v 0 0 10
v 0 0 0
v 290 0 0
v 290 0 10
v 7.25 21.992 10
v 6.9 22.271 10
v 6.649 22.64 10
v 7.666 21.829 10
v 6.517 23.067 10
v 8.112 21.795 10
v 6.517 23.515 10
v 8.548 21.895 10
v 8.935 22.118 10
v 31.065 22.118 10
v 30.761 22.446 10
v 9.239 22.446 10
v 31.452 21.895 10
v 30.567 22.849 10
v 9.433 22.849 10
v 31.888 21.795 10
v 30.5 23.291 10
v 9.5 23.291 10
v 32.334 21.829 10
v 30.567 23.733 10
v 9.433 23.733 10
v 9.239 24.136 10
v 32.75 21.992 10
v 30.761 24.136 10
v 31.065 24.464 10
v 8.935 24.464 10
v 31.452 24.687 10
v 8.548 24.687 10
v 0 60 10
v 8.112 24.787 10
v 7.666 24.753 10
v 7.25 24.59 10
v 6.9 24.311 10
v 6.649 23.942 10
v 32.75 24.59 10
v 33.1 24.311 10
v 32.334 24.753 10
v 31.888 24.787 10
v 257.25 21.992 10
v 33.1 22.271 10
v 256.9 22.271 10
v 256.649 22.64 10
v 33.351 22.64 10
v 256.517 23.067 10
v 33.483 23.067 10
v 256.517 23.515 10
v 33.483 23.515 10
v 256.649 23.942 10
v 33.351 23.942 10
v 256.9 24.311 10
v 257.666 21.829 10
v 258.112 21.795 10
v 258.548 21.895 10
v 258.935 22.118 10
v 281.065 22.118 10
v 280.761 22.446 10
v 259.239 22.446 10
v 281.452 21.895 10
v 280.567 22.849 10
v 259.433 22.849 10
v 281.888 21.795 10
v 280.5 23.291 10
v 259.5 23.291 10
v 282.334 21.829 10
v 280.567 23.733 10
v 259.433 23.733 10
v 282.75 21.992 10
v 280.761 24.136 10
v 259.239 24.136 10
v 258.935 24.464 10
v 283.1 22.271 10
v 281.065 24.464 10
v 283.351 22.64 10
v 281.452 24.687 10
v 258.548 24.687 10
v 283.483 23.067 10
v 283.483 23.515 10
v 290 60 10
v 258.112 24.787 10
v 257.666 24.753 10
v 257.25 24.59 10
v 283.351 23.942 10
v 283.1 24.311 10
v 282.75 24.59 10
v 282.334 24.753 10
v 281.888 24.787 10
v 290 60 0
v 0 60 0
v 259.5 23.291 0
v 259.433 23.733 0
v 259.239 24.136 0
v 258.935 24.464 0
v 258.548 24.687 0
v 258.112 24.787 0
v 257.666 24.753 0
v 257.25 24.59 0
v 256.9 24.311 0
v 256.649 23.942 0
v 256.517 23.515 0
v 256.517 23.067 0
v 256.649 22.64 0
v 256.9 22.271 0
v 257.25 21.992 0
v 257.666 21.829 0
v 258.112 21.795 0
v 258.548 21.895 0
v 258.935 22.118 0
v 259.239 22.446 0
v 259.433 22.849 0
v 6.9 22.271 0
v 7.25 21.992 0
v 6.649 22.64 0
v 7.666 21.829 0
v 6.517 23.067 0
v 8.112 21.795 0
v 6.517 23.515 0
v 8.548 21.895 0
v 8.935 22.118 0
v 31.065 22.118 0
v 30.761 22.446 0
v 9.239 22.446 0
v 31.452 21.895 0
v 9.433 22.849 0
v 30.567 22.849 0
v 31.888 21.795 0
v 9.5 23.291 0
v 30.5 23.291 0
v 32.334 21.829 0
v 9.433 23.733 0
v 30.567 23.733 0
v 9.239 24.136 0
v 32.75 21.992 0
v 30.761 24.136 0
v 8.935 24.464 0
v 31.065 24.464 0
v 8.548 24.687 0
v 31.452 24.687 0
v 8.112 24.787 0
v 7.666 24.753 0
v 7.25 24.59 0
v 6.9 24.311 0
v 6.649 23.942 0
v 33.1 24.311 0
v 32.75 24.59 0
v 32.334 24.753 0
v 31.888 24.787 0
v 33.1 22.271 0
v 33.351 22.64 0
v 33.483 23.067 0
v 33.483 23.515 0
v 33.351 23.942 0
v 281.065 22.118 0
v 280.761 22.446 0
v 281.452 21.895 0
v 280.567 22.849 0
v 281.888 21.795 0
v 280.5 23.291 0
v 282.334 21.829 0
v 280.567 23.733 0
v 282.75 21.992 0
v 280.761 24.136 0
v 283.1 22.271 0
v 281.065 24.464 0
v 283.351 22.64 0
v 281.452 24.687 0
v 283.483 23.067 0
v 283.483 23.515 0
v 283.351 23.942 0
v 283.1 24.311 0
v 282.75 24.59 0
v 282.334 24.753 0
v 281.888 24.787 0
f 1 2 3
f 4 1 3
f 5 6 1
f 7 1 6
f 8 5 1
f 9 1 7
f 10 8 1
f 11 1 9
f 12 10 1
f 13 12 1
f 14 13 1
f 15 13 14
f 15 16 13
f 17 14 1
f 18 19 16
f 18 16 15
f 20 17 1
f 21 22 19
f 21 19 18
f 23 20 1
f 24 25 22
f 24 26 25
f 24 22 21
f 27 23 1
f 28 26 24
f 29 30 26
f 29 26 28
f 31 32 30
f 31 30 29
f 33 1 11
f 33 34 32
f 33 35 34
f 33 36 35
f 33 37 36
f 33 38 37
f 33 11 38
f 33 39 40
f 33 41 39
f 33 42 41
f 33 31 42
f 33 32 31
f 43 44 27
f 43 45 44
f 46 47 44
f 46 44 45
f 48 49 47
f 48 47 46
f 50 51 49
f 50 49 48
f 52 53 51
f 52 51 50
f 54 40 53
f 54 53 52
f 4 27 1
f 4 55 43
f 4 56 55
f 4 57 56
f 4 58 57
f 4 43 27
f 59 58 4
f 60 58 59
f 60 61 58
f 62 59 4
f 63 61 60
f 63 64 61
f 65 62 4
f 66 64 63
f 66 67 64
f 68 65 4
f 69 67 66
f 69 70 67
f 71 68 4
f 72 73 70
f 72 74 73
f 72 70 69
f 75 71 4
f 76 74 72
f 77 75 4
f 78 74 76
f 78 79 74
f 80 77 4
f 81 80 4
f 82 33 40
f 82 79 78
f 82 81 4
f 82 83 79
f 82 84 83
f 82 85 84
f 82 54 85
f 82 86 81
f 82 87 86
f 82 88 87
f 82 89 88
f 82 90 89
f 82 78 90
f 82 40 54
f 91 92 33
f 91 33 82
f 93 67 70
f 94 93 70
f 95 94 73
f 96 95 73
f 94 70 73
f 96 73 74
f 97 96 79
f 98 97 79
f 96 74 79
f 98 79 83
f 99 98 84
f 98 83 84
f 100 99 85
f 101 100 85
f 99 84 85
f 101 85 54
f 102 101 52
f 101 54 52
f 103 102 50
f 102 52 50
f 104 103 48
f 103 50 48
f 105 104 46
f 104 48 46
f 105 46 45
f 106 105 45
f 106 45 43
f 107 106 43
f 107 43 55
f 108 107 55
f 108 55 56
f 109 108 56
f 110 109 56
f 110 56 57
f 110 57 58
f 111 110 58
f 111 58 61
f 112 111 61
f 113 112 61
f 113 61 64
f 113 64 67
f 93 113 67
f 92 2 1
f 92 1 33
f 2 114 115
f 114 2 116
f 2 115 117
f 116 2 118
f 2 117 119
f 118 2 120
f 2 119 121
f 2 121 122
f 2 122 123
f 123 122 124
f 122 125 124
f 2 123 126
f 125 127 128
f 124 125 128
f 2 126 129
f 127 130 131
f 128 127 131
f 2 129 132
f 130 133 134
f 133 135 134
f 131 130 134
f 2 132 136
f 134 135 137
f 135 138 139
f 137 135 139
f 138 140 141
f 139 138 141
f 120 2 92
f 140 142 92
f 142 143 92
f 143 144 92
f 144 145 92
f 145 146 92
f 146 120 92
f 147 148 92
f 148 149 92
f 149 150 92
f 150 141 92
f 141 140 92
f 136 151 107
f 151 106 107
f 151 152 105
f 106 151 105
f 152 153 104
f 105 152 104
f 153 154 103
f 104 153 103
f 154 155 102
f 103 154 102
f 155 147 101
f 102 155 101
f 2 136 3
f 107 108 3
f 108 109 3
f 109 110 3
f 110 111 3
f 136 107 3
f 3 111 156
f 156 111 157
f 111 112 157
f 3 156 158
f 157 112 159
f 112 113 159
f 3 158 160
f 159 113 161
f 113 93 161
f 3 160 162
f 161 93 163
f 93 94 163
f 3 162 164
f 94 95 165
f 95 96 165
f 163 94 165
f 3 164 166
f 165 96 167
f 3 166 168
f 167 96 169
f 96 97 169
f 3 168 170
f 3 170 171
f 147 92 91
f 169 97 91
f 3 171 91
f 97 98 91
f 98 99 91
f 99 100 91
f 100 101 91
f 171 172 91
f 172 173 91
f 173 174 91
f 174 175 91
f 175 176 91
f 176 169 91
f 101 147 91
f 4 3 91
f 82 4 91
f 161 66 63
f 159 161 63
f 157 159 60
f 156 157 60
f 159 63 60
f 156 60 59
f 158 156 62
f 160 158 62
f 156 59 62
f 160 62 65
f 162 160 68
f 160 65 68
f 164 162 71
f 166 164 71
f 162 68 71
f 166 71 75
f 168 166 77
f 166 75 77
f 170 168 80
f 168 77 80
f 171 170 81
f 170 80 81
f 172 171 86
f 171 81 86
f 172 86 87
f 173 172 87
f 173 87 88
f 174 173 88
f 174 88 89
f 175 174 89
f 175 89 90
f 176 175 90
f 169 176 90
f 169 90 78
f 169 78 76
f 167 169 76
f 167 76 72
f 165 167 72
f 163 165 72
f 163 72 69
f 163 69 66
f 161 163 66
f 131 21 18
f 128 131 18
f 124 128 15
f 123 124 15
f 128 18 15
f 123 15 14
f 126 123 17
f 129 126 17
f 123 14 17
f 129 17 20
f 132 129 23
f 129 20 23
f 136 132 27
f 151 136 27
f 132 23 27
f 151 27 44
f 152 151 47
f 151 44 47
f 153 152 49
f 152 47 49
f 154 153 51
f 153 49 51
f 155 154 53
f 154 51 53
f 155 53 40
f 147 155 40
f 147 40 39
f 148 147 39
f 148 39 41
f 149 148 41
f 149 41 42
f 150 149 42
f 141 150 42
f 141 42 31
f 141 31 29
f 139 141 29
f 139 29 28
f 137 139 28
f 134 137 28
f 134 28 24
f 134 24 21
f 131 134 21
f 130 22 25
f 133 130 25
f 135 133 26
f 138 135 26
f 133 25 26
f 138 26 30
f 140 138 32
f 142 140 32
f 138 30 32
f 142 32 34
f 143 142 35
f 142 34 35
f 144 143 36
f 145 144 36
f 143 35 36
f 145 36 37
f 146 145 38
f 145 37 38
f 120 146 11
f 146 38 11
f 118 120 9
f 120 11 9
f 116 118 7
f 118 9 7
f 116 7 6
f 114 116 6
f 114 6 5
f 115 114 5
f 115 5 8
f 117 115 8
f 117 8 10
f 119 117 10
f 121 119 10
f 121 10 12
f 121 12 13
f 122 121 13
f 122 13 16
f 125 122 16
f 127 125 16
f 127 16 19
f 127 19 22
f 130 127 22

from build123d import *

# Parameters (mm, degrees)
SKETCH_1_W          = 290
SKETCH_1_H          = 60
EXTRUDE_333_DEPTH   = 10
SKETCH_3_R          = 1.5
CUT_EXTRUDE_1_DEPTH = 297.310647801


with BuildPart() as part:
    # Эскиз1 → Extrude 333 (new body)
    with BuildSketch(Plane.XY):
        with Locations((145, 30)):
            Rectangle(SKETCH_1_W, SKETCH_1_H)
    extrude(amount=EXTRUDE_333_DEPTH)

    # Эскиз3 → Вырез-Вытянуть1 (cut, through all)
    with BuildSketch(Plane.XY.offset(10)):
        with Locations((8, 23.291028808)):
            Circle(SKETCH_3_R)
        with Locations(Location((32, 23.291028808, 0), (0, 0, 180))):
            Circle(SKETCH_3_R)
        with Locations(Location((282, 23.291028808, 0), (0, 0, 180))):
            Circle(SKETCH_3_R)
        with Locations((258, 23.291028808)):
            Circle(SKETCH_3_R)
    extrude(amount=-CUT_EXTRUDE_1_DEPTH, mode=Mode.SUBTRACT)


solid = part.part
